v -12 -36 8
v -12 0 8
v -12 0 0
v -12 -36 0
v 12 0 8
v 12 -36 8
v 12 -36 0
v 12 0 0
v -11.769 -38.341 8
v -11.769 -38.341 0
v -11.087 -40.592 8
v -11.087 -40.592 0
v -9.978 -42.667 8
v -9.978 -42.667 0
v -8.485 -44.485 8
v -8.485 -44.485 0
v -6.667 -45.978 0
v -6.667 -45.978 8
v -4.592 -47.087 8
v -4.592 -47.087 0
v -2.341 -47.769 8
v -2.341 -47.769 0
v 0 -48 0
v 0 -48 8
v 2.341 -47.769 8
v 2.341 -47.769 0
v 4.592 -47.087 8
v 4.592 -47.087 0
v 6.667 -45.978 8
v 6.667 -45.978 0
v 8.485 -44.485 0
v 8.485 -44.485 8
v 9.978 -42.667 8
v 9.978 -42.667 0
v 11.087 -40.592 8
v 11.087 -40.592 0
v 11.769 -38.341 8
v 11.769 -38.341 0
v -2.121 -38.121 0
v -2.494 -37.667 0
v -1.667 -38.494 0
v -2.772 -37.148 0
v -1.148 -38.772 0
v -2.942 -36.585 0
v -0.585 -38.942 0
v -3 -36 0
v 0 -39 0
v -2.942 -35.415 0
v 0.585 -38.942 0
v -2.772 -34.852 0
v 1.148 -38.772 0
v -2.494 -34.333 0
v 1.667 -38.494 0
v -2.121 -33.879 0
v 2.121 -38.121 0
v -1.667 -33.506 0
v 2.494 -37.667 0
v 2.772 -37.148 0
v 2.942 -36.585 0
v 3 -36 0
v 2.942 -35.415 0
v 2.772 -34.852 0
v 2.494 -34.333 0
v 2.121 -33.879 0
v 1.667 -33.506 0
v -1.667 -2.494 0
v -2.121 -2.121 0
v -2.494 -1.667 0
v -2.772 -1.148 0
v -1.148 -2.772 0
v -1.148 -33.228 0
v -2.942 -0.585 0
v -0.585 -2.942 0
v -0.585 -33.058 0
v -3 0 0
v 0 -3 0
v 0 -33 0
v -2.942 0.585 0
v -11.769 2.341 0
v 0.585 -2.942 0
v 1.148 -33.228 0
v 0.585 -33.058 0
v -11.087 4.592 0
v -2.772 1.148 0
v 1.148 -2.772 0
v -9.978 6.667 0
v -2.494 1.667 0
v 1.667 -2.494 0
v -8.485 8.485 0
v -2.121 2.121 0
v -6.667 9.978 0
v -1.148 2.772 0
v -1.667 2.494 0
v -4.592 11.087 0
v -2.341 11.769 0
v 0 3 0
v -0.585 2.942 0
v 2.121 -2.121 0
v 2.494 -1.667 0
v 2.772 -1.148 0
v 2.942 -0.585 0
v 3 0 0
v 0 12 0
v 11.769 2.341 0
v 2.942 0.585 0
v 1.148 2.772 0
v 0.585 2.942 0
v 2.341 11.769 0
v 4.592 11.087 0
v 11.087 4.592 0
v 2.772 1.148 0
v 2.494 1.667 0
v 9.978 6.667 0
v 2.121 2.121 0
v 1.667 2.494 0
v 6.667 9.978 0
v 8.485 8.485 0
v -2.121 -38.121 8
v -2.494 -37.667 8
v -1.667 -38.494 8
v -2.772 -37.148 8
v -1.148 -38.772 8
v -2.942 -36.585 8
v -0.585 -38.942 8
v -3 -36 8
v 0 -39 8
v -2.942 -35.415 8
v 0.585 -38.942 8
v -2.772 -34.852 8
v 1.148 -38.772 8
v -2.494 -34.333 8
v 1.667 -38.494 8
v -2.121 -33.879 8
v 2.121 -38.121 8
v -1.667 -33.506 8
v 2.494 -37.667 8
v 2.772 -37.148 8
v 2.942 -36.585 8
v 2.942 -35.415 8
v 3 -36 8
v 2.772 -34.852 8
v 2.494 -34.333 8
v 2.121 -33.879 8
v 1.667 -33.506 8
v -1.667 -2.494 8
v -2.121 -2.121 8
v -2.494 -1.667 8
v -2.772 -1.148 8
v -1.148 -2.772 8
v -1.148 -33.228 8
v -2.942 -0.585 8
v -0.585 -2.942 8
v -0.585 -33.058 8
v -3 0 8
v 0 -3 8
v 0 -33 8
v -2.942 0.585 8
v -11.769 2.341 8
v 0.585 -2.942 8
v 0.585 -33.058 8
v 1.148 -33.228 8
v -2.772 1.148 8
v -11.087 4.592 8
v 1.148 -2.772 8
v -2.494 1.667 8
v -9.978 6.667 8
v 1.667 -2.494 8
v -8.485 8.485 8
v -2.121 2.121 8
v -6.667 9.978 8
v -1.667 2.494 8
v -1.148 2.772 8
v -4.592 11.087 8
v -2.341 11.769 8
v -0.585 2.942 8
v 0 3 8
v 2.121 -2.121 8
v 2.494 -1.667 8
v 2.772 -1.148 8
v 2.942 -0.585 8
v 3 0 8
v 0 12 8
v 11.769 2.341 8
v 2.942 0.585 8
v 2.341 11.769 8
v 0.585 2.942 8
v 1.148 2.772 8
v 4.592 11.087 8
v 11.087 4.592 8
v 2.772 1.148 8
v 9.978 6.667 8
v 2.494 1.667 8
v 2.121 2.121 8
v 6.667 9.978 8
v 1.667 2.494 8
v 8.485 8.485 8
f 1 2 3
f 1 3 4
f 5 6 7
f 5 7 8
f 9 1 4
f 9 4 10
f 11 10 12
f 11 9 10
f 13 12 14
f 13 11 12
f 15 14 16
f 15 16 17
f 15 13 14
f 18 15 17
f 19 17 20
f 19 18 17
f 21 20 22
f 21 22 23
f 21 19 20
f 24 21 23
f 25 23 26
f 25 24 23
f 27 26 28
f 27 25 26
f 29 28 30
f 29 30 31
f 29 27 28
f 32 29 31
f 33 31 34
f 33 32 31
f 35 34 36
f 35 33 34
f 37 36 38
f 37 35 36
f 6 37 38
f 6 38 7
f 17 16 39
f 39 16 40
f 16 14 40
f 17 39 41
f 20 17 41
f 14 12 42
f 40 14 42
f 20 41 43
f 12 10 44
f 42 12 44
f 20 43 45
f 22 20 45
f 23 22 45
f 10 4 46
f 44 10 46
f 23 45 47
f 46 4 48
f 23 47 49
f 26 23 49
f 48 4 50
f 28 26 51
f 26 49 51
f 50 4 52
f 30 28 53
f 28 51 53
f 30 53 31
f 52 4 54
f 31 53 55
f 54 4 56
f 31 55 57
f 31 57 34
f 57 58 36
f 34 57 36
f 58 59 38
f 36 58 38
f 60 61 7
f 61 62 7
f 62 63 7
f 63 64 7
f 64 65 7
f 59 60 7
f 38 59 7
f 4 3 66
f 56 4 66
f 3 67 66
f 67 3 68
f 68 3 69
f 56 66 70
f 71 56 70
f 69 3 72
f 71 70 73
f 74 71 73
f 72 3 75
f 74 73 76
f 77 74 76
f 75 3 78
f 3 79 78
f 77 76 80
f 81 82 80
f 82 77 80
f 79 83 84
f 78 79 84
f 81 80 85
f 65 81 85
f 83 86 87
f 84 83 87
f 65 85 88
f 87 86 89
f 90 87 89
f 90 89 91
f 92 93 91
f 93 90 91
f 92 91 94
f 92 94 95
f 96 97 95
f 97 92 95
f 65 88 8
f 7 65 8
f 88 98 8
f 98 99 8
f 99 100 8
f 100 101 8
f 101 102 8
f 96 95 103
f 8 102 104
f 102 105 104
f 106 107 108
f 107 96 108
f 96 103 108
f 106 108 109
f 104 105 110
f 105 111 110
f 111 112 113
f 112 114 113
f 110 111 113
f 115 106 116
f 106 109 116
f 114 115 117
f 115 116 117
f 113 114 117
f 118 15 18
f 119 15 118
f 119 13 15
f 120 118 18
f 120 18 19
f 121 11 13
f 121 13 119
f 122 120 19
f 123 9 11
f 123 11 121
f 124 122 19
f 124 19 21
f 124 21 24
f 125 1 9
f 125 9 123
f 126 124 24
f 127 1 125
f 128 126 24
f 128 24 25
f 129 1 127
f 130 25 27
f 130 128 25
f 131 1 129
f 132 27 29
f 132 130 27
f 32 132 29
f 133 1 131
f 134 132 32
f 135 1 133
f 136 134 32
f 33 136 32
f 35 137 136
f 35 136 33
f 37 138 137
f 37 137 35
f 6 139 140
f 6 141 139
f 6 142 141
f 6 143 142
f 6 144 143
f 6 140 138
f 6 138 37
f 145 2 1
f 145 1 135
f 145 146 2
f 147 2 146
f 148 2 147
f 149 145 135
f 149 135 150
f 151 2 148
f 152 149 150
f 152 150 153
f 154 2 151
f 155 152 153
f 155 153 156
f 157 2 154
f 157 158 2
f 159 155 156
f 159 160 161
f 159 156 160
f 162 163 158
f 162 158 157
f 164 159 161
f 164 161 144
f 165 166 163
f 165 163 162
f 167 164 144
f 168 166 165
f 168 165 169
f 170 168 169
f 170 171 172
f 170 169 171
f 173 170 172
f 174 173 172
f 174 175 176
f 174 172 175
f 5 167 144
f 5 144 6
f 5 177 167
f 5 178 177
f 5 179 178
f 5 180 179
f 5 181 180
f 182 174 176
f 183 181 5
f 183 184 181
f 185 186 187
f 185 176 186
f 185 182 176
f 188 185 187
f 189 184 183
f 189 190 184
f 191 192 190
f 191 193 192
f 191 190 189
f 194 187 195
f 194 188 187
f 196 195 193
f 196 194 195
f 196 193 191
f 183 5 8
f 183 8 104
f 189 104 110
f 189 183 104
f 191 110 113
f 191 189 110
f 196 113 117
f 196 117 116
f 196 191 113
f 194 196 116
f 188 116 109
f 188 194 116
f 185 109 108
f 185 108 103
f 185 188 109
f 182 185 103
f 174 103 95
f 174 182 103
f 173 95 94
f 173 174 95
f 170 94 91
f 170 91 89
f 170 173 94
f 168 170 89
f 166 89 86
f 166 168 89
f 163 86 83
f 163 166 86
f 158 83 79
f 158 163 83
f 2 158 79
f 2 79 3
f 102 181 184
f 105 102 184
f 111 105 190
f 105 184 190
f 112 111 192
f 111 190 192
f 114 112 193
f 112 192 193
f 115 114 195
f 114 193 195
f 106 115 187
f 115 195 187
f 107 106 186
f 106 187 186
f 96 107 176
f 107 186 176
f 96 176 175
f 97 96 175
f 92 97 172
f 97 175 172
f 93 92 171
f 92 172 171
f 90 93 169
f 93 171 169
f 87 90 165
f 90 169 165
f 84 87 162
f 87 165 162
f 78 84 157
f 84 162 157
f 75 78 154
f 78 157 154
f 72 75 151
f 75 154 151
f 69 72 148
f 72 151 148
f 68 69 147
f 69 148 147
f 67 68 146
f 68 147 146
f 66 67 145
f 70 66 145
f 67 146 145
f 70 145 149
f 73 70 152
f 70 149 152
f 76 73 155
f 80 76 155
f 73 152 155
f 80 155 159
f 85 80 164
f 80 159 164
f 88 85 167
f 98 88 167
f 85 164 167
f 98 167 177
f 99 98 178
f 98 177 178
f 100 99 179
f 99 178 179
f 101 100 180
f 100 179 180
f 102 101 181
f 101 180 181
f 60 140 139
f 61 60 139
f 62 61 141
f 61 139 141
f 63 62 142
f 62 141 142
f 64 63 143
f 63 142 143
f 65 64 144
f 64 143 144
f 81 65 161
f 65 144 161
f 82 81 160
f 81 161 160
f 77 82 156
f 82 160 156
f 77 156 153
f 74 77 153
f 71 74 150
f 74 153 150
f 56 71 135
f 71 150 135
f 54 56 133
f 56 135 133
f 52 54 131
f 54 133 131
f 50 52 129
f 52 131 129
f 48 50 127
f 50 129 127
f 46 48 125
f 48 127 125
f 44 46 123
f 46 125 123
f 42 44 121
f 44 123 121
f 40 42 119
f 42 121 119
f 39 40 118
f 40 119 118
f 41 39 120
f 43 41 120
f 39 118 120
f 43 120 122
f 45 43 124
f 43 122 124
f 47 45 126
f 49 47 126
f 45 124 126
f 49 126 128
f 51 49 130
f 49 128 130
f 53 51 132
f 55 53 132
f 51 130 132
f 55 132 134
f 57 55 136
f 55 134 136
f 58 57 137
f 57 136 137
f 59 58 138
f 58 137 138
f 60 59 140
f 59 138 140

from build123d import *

# Parameters (mm, degrees)
SKETCH_1_R      = 3
EXTRUDE_1_DEPTH = 8


with BuildPart() as part:
    # 草图1 → 凸台-拉伸1 (new body)
    with BuildSketch(Plane.XY.offset(8)):
        with BuildLine():
            Line((12, -36), (12, 0))
            ThreePointArc((12, 0), (0, 12), (-12, 0))
            Line((-12, 0), (-12, -36))
            ThreePointArc((-12, -36), (0, -48), (12, -36))
        make_face()
        with Locations((0, -36)):
            Circle(SKETCH_1_R, mode=Mode.SUBTRACT)
        Circle(SKETCH_1_R, mode=Mode.SUBTRACT)
    extrude(amount=-EXTRUDE_1_DEPTH)


solid = part.part
